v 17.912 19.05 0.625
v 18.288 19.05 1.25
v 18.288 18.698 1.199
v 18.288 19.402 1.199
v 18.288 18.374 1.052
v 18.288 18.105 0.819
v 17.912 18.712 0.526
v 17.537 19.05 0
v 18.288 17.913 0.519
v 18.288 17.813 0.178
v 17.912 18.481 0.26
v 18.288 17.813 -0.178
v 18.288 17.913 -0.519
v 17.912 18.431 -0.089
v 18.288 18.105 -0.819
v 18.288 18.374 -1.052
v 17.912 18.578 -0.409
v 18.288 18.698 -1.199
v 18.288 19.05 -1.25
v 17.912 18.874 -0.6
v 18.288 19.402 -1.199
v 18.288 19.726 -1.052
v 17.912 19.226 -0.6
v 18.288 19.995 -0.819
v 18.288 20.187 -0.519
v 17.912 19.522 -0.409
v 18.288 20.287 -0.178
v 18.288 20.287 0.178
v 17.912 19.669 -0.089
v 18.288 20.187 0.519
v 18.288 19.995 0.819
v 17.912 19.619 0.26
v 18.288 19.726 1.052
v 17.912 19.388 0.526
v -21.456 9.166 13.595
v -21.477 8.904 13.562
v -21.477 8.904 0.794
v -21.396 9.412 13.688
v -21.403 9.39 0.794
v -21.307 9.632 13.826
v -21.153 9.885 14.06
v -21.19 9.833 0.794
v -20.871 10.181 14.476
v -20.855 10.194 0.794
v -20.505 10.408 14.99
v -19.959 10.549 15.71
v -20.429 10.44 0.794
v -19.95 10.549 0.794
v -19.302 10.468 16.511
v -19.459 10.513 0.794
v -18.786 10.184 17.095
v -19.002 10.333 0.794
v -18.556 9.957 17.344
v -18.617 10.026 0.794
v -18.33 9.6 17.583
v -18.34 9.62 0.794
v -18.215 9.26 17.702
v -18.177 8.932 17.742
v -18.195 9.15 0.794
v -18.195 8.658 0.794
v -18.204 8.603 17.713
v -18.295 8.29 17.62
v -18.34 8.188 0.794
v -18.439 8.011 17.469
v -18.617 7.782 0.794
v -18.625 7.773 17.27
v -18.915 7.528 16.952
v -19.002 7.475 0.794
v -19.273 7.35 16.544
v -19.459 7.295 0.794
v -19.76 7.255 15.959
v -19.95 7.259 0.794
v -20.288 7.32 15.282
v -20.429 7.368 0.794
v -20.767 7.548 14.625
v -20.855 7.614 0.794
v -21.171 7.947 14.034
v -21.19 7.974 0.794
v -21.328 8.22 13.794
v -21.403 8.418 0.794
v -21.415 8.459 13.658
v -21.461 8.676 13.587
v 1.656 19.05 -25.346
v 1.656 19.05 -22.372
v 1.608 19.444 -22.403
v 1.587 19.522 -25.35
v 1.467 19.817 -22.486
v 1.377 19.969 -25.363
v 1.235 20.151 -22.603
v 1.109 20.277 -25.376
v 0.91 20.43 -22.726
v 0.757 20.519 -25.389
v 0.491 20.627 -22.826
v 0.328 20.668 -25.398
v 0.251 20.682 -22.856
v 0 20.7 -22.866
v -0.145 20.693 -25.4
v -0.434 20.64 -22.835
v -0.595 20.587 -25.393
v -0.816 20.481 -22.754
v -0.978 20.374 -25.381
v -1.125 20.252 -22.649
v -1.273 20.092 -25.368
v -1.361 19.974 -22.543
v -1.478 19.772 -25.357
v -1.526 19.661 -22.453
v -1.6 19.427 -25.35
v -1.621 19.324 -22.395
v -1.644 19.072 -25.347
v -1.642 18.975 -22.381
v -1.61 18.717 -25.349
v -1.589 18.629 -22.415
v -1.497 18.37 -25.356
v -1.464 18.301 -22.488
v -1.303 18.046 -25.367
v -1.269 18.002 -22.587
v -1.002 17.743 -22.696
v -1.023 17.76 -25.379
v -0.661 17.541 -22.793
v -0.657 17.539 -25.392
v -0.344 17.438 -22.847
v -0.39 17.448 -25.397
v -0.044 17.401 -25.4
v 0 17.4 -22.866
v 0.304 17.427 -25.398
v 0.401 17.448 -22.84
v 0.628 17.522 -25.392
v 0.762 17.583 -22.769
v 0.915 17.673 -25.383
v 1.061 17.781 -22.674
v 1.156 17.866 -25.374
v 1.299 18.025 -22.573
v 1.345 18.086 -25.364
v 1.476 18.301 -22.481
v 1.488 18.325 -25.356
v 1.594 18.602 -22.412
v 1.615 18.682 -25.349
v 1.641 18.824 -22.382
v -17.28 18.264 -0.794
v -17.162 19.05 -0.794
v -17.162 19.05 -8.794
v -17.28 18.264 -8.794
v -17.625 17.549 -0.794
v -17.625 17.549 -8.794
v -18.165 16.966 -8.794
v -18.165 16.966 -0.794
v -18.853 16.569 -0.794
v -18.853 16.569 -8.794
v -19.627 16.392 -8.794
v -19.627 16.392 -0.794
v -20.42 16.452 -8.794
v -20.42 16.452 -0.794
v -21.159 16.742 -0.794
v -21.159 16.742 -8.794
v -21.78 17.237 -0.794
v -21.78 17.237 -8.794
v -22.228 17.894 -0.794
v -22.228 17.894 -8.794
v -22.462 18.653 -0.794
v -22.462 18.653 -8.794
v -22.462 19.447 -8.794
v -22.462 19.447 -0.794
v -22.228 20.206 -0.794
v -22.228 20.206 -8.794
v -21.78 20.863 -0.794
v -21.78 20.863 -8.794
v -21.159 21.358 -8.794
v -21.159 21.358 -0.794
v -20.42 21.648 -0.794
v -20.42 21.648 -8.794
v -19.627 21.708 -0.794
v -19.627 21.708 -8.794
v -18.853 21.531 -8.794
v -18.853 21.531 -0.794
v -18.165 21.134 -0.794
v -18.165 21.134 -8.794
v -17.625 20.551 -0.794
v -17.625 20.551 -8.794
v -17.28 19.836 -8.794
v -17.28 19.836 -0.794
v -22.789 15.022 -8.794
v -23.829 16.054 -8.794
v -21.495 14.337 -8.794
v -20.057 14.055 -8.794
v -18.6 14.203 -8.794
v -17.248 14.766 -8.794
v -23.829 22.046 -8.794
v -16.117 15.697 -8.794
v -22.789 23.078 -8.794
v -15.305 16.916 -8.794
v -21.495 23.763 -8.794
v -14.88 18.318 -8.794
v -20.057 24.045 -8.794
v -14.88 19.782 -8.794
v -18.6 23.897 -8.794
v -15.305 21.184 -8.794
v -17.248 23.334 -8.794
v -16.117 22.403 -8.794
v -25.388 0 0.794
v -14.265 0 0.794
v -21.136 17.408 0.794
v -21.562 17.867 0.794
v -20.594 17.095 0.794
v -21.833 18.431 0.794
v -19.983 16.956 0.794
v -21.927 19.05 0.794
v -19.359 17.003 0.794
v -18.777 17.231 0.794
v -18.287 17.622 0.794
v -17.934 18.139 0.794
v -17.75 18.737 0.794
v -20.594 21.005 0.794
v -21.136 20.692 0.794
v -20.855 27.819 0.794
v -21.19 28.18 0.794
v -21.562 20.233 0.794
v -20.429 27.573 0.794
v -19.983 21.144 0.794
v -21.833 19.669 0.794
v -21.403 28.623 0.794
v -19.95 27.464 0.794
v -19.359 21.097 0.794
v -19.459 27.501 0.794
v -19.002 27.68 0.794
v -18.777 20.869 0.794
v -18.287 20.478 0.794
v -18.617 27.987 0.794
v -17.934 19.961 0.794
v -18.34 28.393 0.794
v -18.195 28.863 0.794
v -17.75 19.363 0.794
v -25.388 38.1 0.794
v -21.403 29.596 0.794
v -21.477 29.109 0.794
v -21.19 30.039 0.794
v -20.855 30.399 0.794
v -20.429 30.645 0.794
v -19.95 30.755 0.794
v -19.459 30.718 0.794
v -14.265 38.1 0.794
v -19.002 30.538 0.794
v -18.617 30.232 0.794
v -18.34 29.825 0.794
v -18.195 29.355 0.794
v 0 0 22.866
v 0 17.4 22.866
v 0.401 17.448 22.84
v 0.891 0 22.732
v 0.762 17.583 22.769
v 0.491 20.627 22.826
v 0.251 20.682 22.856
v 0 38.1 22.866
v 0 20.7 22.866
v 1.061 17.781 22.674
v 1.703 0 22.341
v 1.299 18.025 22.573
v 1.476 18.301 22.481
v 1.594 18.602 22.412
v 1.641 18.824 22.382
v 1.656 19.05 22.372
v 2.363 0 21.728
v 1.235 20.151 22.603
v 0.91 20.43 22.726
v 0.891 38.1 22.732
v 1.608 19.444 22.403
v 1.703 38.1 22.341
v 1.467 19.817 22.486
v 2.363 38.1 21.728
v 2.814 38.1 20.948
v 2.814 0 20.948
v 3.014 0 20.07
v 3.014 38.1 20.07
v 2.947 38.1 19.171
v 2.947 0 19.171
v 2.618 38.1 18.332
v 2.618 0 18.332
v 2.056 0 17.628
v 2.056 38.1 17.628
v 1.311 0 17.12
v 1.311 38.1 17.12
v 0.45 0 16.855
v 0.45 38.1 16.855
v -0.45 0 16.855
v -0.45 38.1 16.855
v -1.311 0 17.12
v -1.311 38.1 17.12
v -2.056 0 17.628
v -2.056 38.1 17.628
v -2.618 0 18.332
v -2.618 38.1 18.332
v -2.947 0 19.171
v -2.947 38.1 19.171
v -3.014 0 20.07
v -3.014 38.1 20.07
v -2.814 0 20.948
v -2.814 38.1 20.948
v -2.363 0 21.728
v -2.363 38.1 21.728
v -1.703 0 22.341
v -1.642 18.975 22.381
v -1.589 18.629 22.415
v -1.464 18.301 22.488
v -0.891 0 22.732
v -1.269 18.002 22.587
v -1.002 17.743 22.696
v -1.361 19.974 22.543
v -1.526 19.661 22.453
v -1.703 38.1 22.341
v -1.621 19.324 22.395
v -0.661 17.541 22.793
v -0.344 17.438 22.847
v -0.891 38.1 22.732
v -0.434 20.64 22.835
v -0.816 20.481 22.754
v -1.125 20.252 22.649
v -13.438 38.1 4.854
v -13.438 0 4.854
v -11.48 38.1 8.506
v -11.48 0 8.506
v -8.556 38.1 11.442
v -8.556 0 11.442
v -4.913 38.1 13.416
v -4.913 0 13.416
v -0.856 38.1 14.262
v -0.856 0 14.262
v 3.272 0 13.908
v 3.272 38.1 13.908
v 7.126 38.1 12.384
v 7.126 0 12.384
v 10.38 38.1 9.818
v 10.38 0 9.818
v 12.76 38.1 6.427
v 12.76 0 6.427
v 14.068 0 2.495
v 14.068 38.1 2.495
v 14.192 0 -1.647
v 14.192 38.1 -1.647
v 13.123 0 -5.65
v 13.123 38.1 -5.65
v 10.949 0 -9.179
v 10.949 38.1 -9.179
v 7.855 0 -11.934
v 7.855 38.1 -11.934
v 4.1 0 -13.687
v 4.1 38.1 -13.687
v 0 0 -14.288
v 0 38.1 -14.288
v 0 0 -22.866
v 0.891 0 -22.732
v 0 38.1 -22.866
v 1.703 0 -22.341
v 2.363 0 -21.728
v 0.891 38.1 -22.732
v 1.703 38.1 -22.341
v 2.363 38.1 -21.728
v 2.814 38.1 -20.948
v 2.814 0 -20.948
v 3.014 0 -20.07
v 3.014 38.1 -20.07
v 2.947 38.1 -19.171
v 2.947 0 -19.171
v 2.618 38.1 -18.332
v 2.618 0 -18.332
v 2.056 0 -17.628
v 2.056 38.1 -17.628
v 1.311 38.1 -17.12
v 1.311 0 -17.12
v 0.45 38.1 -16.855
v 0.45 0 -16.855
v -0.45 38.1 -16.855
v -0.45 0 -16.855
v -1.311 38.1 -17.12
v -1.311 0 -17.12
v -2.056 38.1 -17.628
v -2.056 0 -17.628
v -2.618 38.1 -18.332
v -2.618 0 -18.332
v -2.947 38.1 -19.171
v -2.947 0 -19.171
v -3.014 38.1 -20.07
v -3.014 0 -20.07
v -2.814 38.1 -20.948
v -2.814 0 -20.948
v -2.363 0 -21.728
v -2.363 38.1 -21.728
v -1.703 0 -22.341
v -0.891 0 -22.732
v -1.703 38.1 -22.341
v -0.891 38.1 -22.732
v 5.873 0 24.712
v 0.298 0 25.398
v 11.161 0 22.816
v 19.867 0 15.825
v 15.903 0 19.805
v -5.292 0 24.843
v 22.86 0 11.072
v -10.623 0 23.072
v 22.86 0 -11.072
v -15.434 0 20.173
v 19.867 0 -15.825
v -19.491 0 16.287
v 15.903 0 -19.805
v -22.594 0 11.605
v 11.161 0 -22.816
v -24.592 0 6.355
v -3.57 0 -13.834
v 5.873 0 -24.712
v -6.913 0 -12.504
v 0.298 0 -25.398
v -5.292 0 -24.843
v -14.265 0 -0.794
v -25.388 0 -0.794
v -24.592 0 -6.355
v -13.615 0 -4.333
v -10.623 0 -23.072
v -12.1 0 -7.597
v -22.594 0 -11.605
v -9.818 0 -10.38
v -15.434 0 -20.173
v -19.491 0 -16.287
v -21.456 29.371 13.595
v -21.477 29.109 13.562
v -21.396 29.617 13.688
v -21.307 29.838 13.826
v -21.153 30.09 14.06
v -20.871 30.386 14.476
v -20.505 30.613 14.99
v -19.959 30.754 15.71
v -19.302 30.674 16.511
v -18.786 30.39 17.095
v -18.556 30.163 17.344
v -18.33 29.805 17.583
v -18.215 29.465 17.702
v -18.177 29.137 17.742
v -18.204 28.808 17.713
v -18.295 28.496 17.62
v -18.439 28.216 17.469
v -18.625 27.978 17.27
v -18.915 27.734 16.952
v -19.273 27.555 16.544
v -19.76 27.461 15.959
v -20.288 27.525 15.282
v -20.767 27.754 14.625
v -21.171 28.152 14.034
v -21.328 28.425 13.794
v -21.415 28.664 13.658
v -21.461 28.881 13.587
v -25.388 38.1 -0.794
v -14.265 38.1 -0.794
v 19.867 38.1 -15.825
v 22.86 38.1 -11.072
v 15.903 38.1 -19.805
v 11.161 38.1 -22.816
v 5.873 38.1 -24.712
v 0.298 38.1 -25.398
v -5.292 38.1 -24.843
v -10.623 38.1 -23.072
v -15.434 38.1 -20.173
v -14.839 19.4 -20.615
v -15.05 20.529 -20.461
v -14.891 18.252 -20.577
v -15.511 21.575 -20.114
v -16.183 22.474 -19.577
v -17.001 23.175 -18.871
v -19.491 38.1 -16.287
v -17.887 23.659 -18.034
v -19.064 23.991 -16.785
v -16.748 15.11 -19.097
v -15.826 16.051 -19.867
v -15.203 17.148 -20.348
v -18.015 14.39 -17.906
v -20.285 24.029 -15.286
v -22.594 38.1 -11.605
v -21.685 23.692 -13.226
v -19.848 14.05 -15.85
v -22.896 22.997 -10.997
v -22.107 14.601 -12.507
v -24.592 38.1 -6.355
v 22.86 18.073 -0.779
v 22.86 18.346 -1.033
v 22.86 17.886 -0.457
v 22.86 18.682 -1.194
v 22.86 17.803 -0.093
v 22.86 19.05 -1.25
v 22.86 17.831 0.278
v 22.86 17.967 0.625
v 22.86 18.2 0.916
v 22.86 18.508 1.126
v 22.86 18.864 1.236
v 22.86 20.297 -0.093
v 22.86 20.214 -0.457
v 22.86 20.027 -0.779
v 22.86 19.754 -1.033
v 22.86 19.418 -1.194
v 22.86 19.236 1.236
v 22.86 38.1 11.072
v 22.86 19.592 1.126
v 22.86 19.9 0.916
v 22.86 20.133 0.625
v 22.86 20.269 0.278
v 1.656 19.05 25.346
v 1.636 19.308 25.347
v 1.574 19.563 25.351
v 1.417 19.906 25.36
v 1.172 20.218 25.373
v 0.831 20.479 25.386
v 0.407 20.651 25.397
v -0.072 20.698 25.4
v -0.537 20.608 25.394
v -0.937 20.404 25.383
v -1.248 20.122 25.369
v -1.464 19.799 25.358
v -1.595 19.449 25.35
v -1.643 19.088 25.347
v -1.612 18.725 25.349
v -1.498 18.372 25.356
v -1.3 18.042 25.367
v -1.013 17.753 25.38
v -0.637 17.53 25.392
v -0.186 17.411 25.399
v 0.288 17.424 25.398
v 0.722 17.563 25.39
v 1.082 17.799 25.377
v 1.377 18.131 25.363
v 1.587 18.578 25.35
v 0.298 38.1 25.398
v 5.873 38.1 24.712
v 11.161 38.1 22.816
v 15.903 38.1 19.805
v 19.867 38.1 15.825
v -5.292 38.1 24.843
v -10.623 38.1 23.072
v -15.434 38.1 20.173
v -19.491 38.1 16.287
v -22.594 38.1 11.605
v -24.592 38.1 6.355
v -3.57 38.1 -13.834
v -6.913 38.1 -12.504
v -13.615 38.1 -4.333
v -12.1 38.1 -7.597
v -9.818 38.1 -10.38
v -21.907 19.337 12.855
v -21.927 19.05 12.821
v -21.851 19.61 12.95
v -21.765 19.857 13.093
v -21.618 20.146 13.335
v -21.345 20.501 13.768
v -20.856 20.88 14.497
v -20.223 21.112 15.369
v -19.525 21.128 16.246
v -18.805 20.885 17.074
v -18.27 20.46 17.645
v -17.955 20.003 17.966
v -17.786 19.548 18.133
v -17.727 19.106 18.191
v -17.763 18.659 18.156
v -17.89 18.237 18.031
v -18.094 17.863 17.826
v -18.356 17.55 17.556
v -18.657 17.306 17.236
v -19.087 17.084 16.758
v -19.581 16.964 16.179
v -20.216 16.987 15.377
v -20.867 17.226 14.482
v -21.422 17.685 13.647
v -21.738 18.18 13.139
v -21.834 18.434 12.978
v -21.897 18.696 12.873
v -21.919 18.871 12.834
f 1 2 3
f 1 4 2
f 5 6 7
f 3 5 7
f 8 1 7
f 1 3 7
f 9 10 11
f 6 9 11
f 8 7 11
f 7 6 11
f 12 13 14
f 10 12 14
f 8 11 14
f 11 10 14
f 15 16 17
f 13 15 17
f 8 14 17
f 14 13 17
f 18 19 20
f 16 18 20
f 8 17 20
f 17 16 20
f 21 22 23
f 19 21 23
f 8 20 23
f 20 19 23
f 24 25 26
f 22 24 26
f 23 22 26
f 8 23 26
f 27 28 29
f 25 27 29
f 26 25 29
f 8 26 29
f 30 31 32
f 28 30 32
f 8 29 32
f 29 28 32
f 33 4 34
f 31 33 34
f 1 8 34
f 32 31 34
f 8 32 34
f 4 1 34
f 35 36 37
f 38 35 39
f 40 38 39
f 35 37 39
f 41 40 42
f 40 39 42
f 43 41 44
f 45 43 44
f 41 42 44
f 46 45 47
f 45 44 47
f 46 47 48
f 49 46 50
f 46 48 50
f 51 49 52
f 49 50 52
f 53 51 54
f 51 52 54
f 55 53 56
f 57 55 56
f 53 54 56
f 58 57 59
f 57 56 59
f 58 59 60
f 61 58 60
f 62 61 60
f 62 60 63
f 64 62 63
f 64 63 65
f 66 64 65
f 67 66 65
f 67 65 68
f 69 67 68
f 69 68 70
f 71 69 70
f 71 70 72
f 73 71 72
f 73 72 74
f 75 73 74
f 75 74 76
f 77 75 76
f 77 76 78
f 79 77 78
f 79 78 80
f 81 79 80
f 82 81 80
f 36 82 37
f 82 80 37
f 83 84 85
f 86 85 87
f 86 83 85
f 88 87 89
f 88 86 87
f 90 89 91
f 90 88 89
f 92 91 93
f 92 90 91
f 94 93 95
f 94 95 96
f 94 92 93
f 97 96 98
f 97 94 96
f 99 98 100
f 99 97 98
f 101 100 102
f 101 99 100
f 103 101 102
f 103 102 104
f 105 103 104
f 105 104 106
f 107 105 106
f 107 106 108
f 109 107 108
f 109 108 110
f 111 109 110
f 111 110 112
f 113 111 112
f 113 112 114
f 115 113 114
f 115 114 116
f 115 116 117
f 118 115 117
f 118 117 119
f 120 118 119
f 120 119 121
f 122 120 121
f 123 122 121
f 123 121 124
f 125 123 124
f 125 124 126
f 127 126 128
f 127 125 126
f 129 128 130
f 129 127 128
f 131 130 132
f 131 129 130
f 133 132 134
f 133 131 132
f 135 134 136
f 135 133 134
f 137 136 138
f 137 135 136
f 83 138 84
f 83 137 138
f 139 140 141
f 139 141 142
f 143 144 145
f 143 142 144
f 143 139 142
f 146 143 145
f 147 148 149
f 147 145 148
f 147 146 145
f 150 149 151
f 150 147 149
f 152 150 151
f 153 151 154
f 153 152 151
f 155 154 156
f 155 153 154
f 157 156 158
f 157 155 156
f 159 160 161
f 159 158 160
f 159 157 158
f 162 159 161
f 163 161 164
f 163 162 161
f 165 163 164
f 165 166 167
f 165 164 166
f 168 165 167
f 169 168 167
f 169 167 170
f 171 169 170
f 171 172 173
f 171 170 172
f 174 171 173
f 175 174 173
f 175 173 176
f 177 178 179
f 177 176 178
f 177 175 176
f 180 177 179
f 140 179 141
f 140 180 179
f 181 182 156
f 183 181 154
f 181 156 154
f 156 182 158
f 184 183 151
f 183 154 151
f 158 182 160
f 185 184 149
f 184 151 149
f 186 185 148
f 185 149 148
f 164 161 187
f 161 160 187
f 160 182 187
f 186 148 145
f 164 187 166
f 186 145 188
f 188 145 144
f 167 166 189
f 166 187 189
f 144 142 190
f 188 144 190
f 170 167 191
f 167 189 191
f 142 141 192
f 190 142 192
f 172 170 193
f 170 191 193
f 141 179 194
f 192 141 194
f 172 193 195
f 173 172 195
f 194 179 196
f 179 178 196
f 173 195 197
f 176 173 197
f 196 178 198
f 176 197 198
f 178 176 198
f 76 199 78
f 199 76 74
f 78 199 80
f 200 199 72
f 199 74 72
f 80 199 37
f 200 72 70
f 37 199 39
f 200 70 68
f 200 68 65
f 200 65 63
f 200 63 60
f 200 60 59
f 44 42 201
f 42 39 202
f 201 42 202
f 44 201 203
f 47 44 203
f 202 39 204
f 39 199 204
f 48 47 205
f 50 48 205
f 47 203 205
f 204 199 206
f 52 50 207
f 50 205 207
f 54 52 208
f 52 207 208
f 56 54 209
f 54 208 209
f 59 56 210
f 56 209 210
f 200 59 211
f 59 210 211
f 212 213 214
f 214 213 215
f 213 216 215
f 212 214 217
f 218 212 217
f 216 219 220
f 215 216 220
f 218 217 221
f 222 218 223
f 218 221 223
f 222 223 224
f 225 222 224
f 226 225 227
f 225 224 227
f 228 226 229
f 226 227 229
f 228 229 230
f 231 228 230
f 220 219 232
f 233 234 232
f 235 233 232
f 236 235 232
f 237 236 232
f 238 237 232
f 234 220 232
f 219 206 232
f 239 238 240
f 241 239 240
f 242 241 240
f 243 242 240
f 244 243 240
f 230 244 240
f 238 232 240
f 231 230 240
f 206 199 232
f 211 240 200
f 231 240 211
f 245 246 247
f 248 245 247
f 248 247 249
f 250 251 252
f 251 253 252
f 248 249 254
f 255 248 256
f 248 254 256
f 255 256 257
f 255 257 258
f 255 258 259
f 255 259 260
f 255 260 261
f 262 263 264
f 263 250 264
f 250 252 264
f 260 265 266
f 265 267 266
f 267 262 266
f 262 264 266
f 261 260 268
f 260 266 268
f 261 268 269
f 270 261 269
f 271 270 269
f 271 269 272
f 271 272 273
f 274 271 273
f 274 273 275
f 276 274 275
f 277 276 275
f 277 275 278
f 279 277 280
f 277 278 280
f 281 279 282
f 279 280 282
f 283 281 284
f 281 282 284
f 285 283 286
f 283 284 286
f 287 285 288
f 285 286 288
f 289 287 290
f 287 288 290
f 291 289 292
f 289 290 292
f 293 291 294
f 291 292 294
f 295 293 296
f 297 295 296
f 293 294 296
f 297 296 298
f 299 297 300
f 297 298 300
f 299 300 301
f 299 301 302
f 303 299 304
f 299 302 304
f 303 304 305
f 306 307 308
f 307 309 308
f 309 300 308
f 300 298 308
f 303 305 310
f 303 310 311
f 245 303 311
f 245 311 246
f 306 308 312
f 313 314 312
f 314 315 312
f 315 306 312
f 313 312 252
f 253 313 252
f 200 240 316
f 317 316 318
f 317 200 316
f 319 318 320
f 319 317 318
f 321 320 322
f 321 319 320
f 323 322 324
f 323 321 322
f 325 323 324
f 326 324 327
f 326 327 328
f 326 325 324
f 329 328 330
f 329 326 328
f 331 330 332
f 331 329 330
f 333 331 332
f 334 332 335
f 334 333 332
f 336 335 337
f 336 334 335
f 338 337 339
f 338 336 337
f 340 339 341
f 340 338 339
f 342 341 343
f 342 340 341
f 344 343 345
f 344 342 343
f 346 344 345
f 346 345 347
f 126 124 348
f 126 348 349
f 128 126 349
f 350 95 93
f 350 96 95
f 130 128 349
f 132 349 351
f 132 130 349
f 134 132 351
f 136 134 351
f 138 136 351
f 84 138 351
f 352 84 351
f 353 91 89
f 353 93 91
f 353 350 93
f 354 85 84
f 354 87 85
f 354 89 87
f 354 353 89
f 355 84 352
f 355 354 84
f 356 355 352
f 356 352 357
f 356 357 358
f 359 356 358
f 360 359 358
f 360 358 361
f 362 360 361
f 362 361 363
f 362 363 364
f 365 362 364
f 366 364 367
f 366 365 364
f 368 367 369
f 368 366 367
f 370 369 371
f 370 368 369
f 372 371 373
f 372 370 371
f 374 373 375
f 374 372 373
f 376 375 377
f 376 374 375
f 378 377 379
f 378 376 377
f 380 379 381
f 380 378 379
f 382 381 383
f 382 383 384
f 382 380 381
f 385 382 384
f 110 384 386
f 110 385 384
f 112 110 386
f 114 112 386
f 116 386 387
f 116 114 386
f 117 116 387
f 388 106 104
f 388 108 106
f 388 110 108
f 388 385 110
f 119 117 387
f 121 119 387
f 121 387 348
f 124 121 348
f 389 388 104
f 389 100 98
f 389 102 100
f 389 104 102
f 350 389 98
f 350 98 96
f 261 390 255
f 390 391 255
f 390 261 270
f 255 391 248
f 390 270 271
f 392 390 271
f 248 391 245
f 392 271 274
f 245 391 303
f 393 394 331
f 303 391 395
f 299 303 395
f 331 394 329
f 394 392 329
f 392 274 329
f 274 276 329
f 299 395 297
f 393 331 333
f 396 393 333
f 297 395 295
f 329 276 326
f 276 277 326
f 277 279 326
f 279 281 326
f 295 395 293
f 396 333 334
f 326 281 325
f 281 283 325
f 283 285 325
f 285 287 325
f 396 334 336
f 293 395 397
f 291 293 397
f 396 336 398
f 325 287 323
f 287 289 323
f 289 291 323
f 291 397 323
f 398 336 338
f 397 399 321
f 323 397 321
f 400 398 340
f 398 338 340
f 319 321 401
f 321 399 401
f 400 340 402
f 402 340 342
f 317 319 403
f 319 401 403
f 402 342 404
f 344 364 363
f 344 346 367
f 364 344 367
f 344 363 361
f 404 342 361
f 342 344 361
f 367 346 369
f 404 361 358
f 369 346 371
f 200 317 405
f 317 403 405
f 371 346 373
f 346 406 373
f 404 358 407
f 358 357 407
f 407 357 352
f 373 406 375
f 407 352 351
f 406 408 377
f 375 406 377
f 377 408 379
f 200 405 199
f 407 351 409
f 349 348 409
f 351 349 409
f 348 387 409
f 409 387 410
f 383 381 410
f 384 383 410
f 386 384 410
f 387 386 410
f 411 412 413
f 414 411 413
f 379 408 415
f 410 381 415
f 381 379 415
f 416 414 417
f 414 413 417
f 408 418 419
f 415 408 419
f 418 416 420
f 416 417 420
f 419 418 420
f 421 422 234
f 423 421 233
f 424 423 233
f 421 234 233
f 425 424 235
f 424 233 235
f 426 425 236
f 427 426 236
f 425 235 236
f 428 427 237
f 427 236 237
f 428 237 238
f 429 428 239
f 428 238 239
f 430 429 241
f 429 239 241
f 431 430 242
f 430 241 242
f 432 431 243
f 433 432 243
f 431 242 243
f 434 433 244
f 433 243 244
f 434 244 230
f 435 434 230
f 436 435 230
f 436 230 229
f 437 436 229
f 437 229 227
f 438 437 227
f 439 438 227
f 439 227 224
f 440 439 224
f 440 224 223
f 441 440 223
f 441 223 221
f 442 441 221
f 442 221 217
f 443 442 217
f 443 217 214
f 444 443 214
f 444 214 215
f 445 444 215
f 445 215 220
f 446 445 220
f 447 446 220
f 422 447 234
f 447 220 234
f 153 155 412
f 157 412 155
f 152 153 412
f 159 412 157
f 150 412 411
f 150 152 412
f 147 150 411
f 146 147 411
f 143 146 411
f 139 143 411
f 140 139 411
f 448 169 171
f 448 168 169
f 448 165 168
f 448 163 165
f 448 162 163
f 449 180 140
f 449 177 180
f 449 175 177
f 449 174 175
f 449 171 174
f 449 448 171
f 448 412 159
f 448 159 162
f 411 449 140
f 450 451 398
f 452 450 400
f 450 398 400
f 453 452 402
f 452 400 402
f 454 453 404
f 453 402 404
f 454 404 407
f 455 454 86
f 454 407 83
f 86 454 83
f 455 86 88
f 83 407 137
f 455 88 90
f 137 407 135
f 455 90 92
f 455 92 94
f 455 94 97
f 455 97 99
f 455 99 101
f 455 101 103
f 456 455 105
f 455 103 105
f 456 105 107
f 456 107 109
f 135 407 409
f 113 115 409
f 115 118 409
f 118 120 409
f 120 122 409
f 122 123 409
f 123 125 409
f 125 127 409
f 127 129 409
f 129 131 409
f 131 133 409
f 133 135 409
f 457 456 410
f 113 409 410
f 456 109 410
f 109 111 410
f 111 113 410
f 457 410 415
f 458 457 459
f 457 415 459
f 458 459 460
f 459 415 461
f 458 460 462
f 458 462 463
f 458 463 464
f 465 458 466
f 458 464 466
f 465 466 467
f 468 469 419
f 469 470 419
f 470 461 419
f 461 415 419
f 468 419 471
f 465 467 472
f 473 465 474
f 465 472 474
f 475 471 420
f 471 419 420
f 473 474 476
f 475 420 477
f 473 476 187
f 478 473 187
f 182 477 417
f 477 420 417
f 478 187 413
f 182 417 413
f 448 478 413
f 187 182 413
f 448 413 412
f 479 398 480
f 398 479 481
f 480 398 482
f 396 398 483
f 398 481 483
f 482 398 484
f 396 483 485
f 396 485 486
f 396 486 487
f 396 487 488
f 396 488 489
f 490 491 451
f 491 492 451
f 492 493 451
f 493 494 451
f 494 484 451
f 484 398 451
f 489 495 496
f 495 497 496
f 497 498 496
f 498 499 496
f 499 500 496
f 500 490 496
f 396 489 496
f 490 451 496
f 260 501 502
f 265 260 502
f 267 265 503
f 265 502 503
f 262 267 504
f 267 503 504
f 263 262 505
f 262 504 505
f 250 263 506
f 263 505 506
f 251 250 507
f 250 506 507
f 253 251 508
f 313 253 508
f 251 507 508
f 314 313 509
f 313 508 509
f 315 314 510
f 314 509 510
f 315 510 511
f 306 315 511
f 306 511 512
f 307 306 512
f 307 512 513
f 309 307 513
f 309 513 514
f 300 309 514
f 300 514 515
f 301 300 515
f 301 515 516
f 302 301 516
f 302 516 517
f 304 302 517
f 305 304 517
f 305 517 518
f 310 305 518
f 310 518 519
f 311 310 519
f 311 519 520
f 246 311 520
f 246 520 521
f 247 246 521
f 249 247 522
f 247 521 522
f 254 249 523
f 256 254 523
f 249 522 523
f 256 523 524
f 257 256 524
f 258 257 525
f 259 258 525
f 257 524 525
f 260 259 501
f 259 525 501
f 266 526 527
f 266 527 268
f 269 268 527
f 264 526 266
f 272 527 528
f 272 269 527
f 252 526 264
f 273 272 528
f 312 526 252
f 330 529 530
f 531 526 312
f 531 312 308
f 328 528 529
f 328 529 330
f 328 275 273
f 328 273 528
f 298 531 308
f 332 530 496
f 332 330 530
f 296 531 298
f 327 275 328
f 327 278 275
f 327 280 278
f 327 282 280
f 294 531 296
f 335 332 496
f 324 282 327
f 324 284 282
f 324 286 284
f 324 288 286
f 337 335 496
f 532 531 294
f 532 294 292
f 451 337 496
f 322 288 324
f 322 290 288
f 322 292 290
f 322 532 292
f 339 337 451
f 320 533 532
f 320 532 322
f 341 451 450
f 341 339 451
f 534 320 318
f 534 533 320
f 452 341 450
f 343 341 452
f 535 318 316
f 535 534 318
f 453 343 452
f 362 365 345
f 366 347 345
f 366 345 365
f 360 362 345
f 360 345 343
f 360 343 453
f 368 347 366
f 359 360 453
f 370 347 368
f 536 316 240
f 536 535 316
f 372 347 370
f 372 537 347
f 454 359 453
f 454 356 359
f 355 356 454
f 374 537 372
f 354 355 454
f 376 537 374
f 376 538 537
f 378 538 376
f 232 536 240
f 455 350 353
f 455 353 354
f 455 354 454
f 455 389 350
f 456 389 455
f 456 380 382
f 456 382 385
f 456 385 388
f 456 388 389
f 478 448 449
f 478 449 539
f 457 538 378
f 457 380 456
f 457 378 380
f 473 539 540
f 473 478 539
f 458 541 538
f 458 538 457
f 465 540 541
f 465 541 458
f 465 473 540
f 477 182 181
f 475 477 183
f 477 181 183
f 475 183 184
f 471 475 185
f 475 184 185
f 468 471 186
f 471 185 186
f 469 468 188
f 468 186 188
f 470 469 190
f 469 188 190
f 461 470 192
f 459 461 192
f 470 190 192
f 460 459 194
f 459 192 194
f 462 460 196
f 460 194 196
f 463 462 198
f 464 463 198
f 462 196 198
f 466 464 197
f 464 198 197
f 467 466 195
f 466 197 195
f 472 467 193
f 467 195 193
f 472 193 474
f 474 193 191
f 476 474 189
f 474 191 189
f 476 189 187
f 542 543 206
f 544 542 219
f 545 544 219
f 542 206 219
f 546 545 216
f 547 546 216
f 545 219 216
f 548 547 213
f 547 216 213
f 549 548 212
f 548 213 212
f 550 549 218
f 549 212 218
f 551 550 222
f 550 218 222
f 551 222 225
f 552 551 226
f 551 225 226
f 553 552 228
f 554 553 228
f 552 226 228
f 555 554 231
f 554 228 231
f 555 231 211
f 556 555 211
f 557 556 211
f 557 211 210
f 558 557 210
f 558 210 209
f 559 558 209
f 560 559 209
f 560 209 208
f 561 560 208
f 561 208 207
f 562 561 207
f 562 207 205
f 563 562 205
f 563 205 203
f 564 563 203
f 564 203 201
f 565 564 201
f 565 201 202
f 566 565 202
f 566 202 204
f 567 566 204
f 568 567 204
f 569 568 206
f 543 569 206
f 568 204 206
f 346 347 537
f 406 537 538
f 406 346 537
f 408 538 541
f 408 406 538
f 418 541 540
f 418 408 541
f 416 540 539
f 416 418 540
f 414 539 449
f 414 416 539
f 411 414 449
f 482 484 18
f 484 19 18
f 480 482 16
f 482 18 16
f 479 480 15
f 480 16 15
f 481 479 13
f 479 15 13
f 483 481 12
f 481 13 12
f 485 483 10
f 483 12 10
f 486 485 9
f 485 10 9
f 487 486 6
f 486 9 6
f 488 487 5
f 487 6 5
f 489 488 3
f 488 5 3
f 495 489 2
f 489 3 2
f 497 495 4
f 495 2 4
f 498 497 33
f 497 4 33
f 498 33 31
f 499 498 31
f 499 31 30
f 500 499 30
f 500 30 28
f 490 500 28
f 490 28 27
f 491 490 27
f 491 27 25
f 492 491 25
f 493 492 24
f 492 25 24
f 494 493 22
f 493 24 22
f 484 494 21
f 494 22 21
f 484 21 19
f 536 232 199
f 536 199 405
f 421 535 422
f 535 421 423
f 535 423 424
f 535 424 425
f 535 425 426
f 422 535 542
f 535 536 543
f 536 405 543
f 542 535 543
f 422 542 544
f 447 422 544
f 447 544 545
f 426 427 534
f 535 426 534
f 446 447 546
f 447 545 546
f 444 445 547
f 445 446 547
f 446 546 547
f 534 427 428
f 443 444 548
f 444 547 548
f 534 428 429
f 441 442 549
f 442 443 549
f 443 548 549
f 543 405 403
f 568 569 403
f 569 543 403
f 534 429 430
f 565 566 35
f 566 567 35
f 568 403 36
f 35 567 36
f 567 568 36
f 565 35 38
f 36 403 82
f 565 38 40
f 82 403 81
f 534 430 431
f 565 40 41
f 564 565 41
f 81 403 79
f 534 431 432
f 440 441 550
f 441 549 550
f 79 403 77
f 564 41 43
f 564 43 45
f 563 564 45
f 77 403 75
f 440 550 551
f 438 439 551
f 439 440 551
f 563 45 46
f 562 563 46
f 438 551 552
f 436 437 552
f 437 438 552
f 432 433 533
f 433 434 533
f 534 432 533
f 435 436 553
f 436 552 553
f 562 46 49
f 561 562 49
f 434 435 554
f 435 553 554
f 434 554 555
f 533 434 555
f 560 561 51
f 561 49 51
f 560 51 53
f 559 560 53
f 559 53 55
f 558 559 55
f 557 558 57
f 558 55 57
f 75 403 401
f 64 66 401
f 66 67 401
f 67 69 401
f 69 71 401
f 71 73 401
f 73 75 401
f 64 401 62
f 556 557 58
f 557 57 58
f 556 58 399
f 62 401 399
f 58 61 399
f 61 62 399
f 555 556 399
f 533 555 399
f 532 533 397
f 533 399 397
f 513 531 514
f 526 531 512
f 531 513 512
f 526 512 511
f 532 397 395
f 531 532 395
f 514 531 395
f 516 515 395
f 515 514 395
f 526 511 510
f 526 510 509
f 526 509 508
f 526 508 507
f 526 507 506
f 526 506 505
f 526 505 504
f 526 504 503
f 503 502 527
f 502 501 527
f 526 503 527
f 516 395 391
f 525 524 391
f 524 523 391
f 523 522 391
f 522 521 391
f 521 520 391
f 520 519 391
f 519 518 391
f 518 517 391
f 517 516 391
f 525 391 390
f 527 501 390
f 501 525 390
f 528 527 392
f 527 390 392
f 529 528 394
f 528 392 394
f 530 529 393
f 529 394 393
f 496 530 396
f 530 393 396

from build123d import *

# Parameters (mm, degrees)
SKETCH2_R                        = 25.4
SKETCH2_R_2                      = 14.2875
BOSS_EXTRUDE1_DEPTH              = 38.1
CUT_EXTRUDE1_REACH               = 54.363
SKETCH3_W                        = 25.4
SKETCH3_H                        = 1.5875
CUT_EXTRUDE2_REACH               = 54.363
SKETCH4_R                        = 3.0226
TAP_DRILL_FOR_M4X0_7_TAP1_REACH  = 61.824
TAP_DRILL_FOR_M4X0_7_TAP1_BORE_R = 1.65
CUT_EXTRUDE5_REACH               = 70.392
CUT_EXTRUDE5_END_RADIUS          = 3.0226
SKETCH11_R                       = 1.65
CUT_EXTRUDE6_REACH               = 54.363
TAP_DRILL_FOR_M3X0_5_TAP2_D      = 2.5
TAP_DRILL_FOR_M3X0_5_TAP2_DEPTH  = 4.572
TAP_DRILL_FOR_M3X0_5_TAP2_TIP    = 0.751075774
TAP_DRILL_FOR_M5X0_8_TAP1_REACH  = 55.583
TAP_DRILL_FOR_M5X0_8_TAP1_BORE_R = 2.1
SKETCH15_R                       = 2.665
CUT_EXTRUDE7_DEPTH               = 53.7470617
CUT_EXTRUDE8_REACH               = 59.143
SKETCH19_R                       = 5


with BuildPart() as part:
    # Sketch2 → Boss-Extrude1 (new body)
    with BuildSketch(Plane(origin=(0, 0, 0), x_dir=(1, 0, 0), z_dir=(0, 1, 0))):
        with Locations(Location((0, 0, 0), (0, 0, 90))):
            Circle(SKETCH2_R)
        with Locations(Location((0, 0, 0), (0, 0, 90))):
            Circle(SKETCH2_R_2, mode=Mode.SUBTRACT)
    extrude(amount=BOSS_EXTRUDE1_DEPTH)

    # Sketch3 → Cut-Extrude1 (cut, up to next)
    with BuildSketch(Plane(origin=(0, 38.1, 0), x_dir=(1, 0, 0), z_dir=(0, 1, 0)), mode=Mode.PRIVATE) as cut_extrude1_sk1:
        with Locations((-12.7, 0)):
            Rectangle(SKETCH3_W, SKETCH3_H)
    cut_extrude1_tool1 = extrude(cut_extrude1_sk1.sketch, amount=-CUT_EXTRUDE1_REACH, mode=Mode.PRIVATE) & part.part
    add(cut_extrude1_tool1.solids().sort_by_distance((-12.7, 38.1, 0))[0], mode=Mode.SUBTRACT)

    # Sketch4 → Cut-Extrude2 (cut, up to next)
    with BuildSketch(Plane(origin=(0, 38.1, 0), x_dir=(1, 0, 0), z_dir=(0, 1, 0)), mode=Mode.PRIVATE) as cut_extrude2_sk1:
        with Locations(Location((0, -19.84375, 0), (0, 0, 270))):
            Circle(SKETCH4_R)
    cut_extrude2_tool1 = extrude(cut_extrude2_sk1.sketch, amount=-CUT_EXTRUDE2_REACH, mode=Mode.PRIVATE) & part.part
    cut_extrude2 = cut_extrude2_tool1.solids().sort_by_distance((0, 38.1, 19.84375))[0]
    add(cut_extrude2, mode=Mode.SUBTRACT)

    # Tap Drill for M4x0.7 Tap1 bore (on position points) → Tap Drill for M4x0.7 Tap1 (cut, up to next)
    with BuildSketch(Plane(origin=(-19.826514488, 29.109235595, 0.79375), x_dir=(-1, 0, 0), z_dir=(0, 0, -1)), mode=Mode.PRIVATE) as tap_drill_for_m4x0_7_tap1_sk1:
        Circle(TAP_DRILL_FOR_M4X0_7_TAP1_BORE_R)
    tap_drill_for_m4x0_7_tap1_tool1 = extrude(tap_drill_for_m4x0_7_tap1_sk1.sketch, amount=-TAP_DRILL_FOR_M4X0_7_TAP1_REACH, mode=Mode.PRIVATE) & part.part
    # Tap Drill for M4x0.7 Tap1 bore (on position points) → Tap Drill for M4x0.7 Tap1 (cut, up to next)
    with BuildSketch(Plane(origin=(-19.826514488, 29.109235595, 0.79375), x_dir=(-1, 0, 0), z_dir=(0, 0, -1)), mode=Mode.PRIVATE) as tap_drill_for_m4x0_7_tap1_sk2:
        with Locations((0, -20.205281104)):
            Circle(TAP_DRILL_FOR_M4X0_7_TAP1_BORE_R)
    tap_drill_for_m4x0_7_tap1_tool2 = extrude(tap_drill_for_m4x0_7_tap1_sk2.sketch, amount=-TAP_DRILL_FOR_M4X0_7_TAP1_REACH, mode=Mode.PRIVATE) & part.part
    add(tap_drill_for_m4x0_7_tap1_tool1.solids().sort_by_distance((-19.826514, 29.109236, 0.79375))[0], mode=Mode.SUBTRACT)
    add(tap_drill_for_m4x0_7_tap1_tool2.solids().sort_by_distance((-19.826514, 8.903954, 0.79375))[0], mode=Mode.SUBTRACT)

    # Cut-Extrude5: up to this cylinder (the profile starts outside it)
    cut_extrude5_end = Plane(origin=(0, 19.05, 19.84375), z_dir=(0, 1, 0)) * Cylinder(CUT_EXTRUDE5_END_RADIUS, 147.8292, mode=Mode.PRIVATE)
    # Sketch11 → Cut-Extrude5 (cut, up to the surface)
    with BuildSketch(Plane.XY.offset(25.4), mode=Mode.PRIVATE) as cut_extrude5_sk1:
        with Locations((0.006202687, 19.05)):
            Circle(SKETCH11_R)
    cut_extrude5_tool1 = extrude(cut_extrude5_sk1.sketch, amount=-CUT_EXTRUDE5_REACH, mode=Mode.PRIVATE) - cut_extrude5_end
    cut_extrude5 = cut_extrude5_tool1.solids().sort_by_distance((0.006203, 19.05, 25.4))[0]
    add(cut_extrude5, mode=Mode.SUBTRACT)

    # Mirror1: Cut-Extrude2, Cut-Extrude5 across plane
    add(cut_extrude2.mirror(Plane.XY), mode=Mode.SUBTRACT)
    add(cut_extrude5.mirror(Plane.XY), mode=Mode.SUBTRACT)

    # Sketch12 → Cut-Extrude6 (cut, up to next)
    with BuildSketch(Plane(origin=(0, 38.1, 0), x_dir=(1, 0, 0), z_dir=(0, 1, 0)), mode=Mode.PRIVATE) as cut_extrude6_sk1:
        with BuildLine():
            Line((22.86, 11.071603317), (22.86, -11.071603317))
            ThreePointArc((22.86, -11.071603317), (25.4, 0), (22.86, 11.071603317))
        make_face()
    cut_extrude6_tool1 = extrude(cut_extrude6_sk1.sketch, amount=-CUT_EXTRUDE6_REACH, mode=Mode.PRIVATE) & part.part
    add(cut_extrude6_tool1.solids().sort_by_distance((23.880484, 38.1, 0))[0], mode=Mode.SUBTRACT)

    # Tap Drill for M3x0.5 Tap2
    with Locations(Plane(origin=(22.86, 19.05, 0), x_dir=(0, 0, 1), z_dir=(1, 0, 0))):
        with Locations((0, 0)):
            Hole(TAP_DRILL_FOR_M3X0_5_TAP2_D / 2, depth=TAP_DRILL_FOR_M3X0_5_TAP2_DEPTH)
            with Locations((0, 0, -(TAP_DRILL_FOR_M3X0_5_TAP2_DEPTH + TAP_DRILL_FOR_M3X0_5_TAP2_TIP / 2))):  # 118° drill point
                Cone(0, TAP_DRILL_FOR_M3X0_5_TAP2_D / 2, TAP_DRILL_FOR_M3X0_5_TAP2_TIP, mode=Mode.SUBTRACT)

    # Tap Drill for M5x0.8 Tap1 bore (on position points) → Tap Drill for M5x0.8 Tap1 (cut, up to next)
    with BuildSketch(Plane(origin=(-19.826514488, 19.05, 0.79375), x_dir=(-1, 0, 0), z_dir=(0, 0, -1)), mode=Mode.PRIVATE) as tap_drill_for_m5x0_8_tap1_sk1:
        Circle(TAP_DRILL_FOR_M5X0_8_TAP1_BORE_R)
    tap_drill_for_m5x0_8_tap1_tool1 = extrude(tap_drill_for_m5x0_8_tap1_sk1.sketch, amount=-TAP_DRILL_FOR_M5X0_8_TAP1_REACH, mode=Mode.PRIVATE) & part.part
    add(tap_drill_for_m5x0_8_tap1_tool1.solids().sort_by_distance((-19.826514, 19.05, 0.79375))[0], mode=Mode.SUBTRACT)

    # Sketch15 → Cut-Extrude7 (cut, through all)
    with BuildSketch(Plane(origin=(0, 0, 0.79375), x_dir=(-1, 0, 0), z_dir=(0, 0, -1))):
        with Locations(Location((19.826514488, 19.05, 0), (0, 0, 180))):
            Circle(SKETCH15_R)
    extrude(amount=CUT_EXTRUDE7_DEPTH, mode=Mode.SUBTRACT)

    # Sketch19 → Cut-Extrude8 (cut, up to next)
    with BuildSketch(Plane.XY.offset(-8.79375), mode=Mode.PRIVATE) as cut_extrude8_sk1:
        with Locations((-19.826514488, 19.05)):
            Circle(SKETCH19_R)
    cut_extrude8_tool1 = extrude(cut_extrude8_sk1.sketch, amount=-CUT_EXTRUDE8_REACH, mode=Mode.PRIVATE) & part.part
    add(cut_extrude8_tool1.solids().sort_by_distance((-19.826514, 19.05, -8.79375))[0], mode=Mode.SUBTRACT)


solid = part.part
